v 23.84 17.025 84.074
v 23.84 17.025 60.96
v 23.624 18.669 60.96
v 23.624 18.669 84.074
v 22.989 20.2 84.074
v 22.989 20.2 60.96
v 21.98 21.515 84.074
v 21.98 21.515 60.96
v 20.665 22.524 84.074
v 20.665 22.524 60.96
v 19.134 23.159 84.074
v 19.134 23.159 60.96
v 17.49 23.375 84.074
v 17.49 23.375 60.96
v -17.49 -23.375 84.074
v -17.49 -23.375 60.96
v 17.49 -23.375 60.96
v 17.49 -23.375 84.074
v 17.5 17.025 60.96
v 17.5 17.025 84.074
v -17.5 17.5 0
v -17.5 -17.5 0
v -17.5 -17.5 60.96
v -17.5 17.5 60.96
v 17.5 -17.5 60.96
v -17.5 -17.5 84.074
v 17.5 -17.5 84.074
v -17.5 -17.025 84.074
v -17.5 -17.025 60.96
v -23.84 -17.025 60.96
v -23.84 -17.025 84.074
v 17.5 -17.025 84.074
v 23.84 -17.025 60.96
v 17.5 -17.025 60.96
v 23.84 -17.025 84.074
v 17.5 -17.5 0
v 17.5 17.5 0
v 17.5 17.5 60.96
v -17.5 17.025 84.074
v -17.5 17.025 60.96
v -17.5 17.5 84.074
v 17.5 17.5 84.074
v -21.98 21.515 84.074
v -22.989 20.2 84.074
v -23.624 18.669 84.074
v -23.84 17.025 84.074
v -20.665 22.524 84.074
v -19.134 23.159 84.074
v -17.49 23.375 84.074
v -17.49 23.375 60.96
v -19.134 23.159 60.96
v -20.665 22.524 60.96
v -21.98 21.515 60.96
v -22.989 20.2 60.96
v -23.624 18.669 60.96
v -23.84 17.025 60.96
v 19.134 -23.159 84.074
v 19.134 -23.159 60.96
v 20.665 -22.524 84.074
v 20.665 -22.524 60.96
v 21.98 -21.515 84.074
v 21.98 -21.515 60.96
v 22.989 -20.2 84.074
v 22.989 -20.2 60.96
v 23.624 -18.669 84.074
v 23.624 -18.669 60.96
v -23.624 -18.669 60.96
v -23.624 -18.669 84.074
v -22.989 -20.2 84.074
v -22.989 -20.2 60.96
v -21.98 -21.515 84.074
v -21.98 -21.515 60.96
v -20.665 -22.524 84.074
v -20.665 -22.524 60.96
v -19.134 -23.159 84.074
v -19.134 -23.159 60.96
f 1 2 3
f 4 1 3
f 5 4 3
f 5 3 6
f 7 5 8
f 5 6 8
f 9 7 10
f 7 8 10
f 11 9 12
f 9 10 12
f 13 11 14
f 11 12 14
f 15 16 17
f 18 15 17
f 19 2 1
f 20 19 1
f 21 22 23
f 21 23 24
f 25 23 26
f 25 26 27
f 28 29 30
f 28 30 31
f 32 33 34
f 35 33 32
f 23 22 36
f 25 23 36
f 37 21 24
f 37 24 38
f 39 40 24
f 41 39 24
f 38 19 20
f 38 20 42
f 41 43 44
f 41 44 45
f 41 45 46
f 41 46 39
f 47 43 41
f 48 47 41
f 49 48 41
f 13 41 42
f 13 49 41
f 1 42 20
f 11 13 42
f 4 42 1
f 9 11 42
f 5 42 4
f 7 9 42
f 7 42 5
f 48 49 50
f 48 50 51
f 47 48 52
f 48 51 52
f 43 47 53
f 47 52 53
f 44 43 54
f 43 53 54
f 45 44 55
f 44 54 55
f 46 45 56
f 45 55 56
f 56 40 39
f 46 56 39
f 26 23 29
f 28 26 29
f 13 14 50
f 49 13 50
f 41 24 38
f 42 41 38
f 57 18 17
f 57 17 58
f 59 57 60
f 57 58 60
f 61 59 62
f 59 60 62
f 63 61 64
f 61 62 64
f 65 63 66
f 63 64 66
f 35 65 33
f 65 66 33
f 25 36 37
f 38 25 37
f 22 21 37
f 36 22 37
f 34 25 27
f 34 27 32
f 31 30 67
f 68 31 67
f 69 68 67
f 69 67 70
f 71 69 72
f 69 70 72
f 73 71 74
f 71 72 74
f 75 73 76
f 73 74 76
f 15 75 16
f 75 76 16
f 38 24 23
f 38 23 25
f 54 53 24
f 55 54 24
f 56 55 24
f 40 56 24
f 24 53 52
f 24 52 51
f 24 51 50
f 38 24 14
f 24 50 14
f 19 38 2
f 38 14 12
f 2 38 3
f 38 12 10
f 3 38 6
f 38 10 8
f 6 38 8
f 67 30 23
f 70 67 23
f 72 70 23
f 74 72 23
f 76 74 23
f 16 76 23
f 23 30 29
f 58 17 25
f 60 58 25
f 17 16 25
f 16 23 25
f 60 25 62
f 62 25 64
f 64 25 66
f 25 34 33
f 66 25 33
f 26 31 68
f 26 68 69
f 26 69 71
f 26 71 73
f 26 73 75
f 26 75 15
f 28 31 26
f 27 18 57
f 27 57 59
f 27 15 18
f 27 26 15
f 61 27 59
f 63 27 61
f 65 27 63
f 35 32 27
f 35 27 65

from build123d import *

# Parameters (mm, degrees)
F0_W      = 35
F0_H      = 35
F1_DEPTH  = 60.96
F2_W      = 35
F2_H      = 35
F3_DEPTH  = 23.114
F3_FACE_W = 34.050028
F3_FACE_H = 23.114
F4_DEPTH  = 64.516


with BuildPart() as f1:
    # F0 (on Top) → F1 (new body)
    with BuildSketch(Plane.XY):
        Rectangle(F0_W, F0_H)
    extrude(amount=F1_DEPTH)


with BuildPart() as f3:
    # F2 (on face) → F3 (new body)
    with BuildSketch(Plane.XY.offset(60.96)):
        with BuildLine():
            Line((17.490189, 23.375014), (-17.490189, 23.375014))
            ThreePointArc((-17.490189, 23.375014), (-21.980317, 21.515142), (-23.840189, 17.025014))
            Line((-23.840189, 17.025014), (-23.840189, -17.025014))
            ThreePointArc((-23.840189, -17.025014), (-21.980317, -21.515142), (-17.490189, -23.375014))
            Line((-17.490189, -23.375014), (17.490189, -23.375014))
            ThreePointArc((17.490189, -23.375014), (21.980317, -21.515142), (23.840189, -17.025014))
            Line((23.840189, -17.025014), (23.840189, 17.025014))
            ThreePointArc((23.840189, 17.025014), (21.980317, 21.515142), (17.490189, 23.375014))
        make_face()
        Rectangle(F2_W, F2_H, mode=Mode.SUBTRACT)
    extrude(amount=F3_DEPTH)

    # F3_face (on face) → F4 (cut)
    with BuildSketch(Plane(origin=(23.840189, 0, 72.517), x_dir=(0, 1, 0), z_dir=(1, 0, 0))):
        Rectangle(F3_FACE_W, F3_FACE_H)
    extrude(amount=-F4_DEPTH, mode=Mode.SUBTRACT)


solid = Compound([f1.part, f3.part])
